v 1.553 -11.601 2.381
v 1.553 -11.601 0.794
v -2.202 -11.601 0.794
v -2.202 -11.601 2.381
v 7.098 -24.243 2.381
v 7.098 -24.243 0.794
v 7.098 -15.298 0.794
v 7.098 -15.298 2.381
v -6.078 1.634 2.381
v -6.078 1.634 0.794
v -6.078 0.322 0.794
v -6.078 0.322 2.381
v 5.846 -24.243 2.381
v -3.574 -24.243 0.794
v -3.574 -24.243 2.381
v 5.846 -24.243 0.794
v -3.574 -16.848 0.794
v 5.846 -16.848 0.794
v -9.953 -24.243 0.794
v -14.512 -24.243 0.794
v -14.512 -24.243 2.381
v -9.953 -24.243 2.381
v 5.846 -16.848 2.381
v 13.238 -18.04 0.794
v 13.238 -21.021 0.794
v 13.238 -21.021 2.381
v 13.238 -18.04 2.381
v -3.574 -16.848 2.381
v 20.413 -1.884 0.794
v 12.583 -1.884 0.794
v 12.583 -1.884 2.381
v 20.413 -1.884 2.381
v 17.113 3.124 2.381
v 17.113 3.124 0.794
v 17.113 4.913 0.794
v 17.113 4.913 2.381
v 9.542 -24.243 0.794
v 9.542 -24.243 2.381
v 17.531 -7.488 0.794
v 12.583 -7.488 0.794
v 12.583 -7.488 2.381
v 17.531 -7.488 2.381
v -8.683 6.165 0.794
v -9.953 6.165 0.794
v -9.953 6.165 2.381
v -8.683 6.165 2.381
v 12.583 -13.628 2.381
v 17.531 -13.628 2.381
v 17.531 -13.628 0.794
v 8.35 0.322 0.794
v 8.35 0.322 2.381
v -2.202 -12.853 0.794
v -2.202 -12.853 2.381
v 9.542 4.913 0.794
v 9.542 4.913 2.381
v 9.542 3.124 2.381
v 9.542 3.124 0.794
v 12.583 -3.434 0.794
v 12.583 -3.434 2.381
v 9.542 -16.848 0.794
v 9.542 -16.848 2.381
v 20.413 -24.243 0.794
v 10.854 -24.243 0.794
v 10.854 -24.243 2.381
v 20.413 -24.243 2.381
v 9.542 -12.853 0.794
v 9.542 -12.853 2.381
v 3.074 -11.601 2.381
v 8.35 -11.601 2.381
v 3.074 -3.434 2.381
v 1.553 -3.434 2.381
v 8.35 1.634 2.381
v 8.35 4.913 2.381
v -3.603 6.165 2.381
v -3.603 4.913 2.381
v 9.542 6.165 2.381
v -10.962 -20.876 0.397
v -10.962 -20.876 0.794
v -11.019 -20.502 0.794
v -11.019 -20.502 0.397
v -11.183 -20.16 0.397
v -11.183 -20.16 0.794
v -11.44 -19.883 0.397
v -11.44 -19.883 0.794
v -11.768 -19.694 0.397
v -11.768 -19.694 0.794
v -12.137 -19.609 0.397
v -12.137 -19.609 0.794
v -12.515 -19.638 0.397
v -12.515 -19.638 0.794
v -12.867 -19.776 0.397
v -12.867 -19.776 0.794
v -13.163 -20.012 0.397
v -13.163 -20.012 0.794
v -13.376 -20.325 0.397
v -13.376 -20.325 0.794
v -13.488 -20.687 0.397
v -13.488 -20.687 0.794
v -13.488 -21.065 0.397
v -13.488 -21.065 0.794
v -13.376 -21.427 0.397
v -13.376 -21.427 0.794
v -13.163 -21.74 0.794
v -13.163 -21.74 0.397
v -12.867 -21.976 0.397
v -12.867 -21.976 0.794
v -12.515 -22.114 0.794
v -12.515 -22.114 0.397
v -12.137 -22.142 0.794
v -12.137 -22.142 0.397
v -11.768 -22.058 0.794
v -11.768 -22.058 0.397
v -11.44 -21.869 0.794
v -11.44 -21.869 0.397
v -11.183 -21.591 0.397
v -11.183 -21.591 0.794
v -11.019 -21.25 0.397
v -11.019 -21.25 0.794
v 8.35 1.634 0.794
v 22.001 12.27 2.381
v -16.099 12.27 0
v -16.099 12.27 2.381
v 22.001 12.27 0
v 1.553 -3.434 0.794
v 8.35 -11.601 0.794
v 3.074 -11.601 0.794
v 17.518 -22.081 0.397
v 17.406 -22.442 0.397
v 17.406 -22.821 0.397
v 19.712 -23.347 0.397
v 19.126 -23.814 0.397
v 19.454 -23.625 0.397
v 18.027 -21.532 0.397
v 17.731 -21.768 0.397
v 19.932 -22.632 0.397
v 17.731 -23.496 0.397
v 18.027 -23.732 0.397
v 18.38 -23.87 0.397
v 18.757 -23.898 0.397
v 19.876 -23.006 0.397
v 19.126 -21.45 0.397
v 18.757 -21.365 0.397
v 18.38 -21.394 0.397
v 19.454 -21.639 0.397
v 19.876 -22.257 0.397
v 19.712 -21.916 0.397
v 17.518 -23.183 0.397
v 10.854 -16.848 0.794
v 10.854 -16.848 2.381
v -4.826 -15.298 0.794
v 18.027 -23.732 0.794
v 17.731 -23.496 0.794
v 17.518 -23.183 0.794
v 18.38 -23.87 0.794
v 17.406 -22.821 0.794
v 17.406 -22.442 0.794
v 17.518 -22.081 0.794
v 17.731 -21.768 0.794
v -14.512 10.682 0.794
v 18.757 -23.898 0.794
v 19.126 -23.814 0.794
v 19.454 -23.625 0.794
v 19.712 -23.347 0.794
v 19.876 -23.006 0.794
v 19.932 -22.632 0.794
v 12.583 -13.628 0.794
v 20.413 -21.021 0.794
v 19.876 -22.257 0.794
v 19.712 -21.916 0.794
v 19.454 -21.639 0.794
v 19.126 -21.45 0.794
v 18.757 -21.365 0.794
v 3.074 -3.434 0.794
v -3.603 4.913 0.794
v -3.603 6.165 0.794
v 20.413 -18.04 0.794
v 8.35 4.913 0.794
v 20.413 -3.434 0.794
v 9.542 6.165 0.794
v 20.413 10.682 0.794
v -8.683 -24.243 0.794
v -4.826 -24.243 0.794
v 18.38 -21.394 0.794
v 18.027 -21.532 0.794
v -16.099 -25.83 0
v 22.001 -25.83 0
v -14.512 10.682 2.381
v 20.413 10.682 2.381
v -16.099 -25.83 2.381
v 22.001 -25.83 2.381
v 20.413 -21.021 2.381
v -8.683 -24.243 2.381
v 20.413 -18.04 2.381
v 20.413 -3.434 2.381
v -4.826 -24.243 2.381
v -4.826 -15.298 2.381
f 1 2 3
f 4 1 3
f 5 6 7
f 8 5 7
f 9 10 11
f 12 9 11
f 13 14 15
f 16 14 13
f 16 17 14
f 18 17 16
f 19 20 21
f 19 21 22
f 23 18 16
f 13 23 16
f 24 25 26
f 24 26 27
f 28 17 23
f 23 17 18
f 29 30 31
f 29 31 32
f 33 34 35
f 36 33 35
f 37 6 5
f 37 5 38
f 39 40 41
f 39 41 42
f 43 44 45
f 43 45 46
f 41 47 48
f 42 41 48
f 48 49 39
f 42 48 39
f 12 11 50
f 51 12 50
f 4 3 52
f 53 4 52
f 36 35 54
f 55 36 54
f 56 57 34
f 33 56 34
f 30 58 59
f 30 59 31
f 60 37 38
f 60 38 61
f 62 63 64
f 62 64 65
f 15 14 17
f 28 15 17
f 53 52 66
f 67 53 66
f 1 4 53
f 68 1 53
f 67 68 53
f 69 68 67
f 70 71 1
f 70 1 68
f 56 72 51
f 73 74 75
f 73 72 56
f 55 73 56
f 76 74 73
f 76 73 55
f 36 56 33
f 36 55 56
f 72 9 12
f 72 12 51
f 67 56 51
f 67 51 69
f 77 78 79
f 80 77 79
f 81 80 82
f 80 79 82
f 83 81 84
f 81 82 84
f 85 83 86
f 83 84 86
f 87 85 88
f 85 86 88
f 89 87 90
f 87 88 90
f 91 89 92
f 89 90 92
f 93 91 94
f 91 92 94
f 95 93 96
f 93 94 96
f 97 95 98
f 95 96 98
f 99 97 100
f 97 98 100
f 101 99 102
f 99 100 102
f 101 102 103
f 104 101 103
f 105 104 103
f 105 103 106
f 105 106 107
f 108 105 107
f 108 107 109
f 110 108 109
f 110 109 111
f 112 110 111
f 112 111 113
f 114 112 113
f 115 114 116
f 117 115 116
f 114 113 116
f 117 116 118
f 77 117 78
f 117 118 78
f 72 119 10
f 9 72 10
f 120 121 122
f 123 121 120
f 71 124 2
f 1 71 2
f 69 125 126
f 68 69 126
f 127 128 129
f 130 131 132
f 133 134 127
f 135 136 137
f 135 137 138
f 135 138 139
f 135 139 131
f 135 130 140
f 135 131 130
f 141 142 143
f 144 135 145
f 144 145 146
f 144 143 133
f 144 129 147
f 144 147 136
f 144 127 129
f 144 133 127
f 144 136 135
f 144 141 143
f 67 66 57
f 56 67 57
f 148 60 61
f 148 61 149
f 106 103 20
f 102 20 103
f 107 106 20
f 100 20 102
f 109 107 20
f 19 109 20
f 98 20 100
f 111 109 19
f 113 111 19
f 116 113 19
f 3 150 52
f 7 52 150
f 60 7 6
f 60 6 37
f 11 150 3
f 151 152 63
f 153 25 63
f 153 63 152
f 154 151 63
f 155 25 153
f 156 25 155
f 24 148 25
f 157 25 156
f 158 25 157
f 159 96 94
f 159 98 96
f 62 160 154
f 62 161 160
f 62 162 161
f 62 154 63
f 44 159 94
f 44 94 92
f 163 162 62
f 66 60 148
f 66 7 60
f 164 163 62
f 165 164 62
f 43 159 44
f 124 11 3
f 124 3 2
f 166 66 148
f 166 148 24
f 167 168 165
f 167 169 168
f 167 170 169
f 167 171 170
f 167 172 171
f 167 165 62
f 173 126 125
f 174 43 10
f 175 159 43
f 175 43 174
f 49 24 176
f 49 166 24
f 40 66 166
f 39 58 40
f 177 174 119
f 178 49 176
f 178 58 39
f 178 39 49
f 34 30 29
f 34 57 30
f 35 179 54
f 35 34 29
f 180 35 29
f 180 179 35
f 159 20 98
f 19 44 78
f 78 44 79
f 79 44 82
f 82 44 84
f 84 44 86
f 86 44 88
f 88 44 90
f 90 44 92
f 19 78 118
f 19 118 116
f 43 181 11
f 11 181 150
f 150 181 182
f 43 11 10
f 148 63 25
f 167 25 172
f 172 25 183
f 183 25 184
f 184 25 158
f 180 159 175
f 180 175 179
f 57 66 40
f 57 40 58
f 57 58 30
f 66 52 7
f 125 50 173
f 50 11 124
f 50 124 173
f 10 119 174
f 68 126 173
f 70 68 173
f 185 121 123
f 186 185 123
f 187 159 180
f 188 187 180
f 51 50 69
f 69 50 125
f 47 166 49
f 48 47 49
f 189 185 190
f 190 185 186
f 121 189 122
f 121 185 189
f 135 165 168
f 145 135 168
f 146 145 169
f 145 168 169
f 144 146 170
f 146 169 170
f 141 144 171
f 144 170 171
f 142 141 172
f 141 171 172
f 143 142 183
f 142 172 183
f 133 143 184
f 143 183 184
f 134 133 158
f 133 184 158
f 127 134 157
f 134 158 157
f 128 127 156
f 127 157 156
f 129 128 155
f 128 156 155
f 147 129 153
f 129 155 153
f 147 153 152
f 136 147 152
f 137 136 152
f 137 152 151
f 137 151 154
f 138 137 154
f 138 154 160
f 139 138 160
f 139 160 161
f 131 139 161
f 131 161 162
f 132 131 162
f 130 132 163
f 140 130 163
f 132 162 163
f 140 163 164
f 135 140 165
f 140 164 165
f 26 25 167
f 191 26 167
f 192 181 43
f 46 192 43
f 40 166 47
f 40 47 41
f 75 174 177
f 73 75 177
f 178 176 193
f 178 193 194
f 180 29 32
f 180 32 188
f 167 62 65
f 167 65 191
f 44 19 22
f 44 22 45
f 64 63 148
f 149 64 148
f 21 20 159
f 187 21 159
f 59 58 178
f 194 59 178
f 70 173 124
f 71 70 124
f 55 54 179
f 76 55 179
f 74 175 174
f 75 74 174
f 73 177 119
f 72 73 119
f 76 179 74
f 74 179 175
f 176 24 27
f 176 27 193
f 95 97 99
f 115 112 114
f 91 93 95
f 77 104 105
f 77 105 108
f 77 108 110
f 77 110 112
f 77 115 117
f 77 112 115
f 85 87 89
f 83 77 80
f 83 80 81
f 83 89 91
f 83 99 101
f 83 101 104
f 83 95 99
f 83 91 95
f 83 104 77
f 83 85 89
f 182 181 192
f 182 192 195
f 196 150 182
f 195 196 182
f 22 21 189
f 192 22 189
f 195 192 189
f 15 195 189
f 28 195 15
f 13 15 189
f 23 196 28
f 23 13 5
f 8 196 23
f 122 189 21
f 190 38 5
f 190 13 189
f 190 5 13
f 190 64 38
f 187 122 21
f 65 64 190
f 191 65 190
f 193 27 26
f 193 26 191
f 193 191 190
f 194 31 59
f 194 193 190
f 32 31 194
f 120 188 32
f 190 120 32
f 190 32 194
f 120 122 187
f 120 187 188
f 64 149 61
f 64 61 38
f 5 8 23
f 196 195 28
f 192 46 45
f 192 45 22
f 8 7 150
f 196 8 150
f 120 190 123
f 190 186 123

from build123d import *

# Parameters (mm, degrees)
F0_W     = 38.1
F0_H     = 38.1
F1_DEPTH = 0.79375
F2_W     = 38.1
F2_H     = 38.1
F2_W_2   = 34.925
F2_H_2   = 34.925
F3_DEPTH = 1.5875
F4_W     = 1.27
F4_H     = 30.4073842667
F4_W_2   = 7.8308774173
F4_H_2   = 1.5500376467
F4_W_3   = 4.9481987953
F4_H_3   = 6.1405338347
F4_W_4   = 7.175091283
F4_H_4   = 2.9808413237
F4_W_5   = 1.311570406
F4_H_5   = 7.3952877388
F5_DEPTH = 1.5875
F6_R     = 1.27
F7_DEPTH = 0.396875


with BuildPart() as f1:
    # F0 (on Top) → F1 (new body)
    with BuildSketch(Plane.XY):
        with Locations((2.9509142041, -6.7803348825)):
            Rectangle(F0_W, F0_H)
    extrude(amount=F1_DEPTH)

    # F2 (on face) → F3 (join)
    with BuildSketch(Plane.XY.offset(0.79375)):
        with Locations((2.9509142041, -6.7803348825)):
            Rectangle(F2_W, F2_H)
        with Locations((2.9509142041, -6.7803348825)):
            Rectangle(F2_W_2, F2_H_2, mode=Mode.SUBTRACT)
    extrude(amount=F3_DEPTH)

    # F4 (on face) → F5 (join)
    with BuildSketch(Plane.XY.offset(0.79375)):
        with Locations((-9.3176252598, -9.0391427491)):
            Rectangle(F4_W, F4_H)
        Polygon((9.5420787111, 6.1645493843), (-3.6026252598, 6.1645493843), (-3.6026252598, 4.9125957303), (8.3497418091, 4.9125957303), (8.3497418091, 1.6336699482), (-6.0775312595, 1.6336699482), (-6.0775312595, 0.3220996878), (8.3497418091, 0.3220996878), (8.3497418091, -11.6012664512), (3.0736522749, -11.6012664512), (3.0736522749, -3.4337604884), (1.5534231206, -3.4337604884), (1.5534231206, -11.6012664512), (-2.2024372593, -11.6012664512), (-2.2024372593, -12.8532201052), (8.3497418091, -12.8532201052), (9.5420787111, -12.8532201052), (9.5420787111, 3.1240906101), (17.113417387, 3.1240906101), (17.113417387, 4.9125957303), (9.5420787111, 4.9125957303), align=None)
        with Locations((16.4979754955, -2.6587416651)):
            Rectangle(F4_W_2, F4_H_2)
        with Locations((15.0566361845, -10.5579718947)):
            Rectangle(F4_W_3, F4_H_3)
        with Locations((16.8258685626, -19.5303047076)):
            Rectangle(F4_W_4, F4_H_4)
        with Locations((10.1978639141, -20.5451910131)):
            Rectangle(F4_W_5, F4_H_5)
        Polygon((-4.8255776055, -15.2975097299), (-4.8255776055, -24.2428348825), (-3.5736244172, -24.2428348825), (-3.5736244172, -16.8475471437), (5.8458349667, -16.8475471437), (5.8458349667, -24.2428348825), (7.0977881551, -24.2428348825), (7.0977881551, -15.2975097299), align=None)
    extrude(amount=F5_DEPTH)

    # F6 (on face) → F7 (cut)
    with BuildSketch(Plane.XY.offset(0.79375)):
        with Locations((-12.2321055278, -20.8758749068)):
            Circle(F6_R)
        with Locations((18.6622906476, -22.631780126)):
            Circle(F6_R)
    extrude(amount=-F7_DEPTH, mode=Mode.SUBTRACT)


solid = f1.part
